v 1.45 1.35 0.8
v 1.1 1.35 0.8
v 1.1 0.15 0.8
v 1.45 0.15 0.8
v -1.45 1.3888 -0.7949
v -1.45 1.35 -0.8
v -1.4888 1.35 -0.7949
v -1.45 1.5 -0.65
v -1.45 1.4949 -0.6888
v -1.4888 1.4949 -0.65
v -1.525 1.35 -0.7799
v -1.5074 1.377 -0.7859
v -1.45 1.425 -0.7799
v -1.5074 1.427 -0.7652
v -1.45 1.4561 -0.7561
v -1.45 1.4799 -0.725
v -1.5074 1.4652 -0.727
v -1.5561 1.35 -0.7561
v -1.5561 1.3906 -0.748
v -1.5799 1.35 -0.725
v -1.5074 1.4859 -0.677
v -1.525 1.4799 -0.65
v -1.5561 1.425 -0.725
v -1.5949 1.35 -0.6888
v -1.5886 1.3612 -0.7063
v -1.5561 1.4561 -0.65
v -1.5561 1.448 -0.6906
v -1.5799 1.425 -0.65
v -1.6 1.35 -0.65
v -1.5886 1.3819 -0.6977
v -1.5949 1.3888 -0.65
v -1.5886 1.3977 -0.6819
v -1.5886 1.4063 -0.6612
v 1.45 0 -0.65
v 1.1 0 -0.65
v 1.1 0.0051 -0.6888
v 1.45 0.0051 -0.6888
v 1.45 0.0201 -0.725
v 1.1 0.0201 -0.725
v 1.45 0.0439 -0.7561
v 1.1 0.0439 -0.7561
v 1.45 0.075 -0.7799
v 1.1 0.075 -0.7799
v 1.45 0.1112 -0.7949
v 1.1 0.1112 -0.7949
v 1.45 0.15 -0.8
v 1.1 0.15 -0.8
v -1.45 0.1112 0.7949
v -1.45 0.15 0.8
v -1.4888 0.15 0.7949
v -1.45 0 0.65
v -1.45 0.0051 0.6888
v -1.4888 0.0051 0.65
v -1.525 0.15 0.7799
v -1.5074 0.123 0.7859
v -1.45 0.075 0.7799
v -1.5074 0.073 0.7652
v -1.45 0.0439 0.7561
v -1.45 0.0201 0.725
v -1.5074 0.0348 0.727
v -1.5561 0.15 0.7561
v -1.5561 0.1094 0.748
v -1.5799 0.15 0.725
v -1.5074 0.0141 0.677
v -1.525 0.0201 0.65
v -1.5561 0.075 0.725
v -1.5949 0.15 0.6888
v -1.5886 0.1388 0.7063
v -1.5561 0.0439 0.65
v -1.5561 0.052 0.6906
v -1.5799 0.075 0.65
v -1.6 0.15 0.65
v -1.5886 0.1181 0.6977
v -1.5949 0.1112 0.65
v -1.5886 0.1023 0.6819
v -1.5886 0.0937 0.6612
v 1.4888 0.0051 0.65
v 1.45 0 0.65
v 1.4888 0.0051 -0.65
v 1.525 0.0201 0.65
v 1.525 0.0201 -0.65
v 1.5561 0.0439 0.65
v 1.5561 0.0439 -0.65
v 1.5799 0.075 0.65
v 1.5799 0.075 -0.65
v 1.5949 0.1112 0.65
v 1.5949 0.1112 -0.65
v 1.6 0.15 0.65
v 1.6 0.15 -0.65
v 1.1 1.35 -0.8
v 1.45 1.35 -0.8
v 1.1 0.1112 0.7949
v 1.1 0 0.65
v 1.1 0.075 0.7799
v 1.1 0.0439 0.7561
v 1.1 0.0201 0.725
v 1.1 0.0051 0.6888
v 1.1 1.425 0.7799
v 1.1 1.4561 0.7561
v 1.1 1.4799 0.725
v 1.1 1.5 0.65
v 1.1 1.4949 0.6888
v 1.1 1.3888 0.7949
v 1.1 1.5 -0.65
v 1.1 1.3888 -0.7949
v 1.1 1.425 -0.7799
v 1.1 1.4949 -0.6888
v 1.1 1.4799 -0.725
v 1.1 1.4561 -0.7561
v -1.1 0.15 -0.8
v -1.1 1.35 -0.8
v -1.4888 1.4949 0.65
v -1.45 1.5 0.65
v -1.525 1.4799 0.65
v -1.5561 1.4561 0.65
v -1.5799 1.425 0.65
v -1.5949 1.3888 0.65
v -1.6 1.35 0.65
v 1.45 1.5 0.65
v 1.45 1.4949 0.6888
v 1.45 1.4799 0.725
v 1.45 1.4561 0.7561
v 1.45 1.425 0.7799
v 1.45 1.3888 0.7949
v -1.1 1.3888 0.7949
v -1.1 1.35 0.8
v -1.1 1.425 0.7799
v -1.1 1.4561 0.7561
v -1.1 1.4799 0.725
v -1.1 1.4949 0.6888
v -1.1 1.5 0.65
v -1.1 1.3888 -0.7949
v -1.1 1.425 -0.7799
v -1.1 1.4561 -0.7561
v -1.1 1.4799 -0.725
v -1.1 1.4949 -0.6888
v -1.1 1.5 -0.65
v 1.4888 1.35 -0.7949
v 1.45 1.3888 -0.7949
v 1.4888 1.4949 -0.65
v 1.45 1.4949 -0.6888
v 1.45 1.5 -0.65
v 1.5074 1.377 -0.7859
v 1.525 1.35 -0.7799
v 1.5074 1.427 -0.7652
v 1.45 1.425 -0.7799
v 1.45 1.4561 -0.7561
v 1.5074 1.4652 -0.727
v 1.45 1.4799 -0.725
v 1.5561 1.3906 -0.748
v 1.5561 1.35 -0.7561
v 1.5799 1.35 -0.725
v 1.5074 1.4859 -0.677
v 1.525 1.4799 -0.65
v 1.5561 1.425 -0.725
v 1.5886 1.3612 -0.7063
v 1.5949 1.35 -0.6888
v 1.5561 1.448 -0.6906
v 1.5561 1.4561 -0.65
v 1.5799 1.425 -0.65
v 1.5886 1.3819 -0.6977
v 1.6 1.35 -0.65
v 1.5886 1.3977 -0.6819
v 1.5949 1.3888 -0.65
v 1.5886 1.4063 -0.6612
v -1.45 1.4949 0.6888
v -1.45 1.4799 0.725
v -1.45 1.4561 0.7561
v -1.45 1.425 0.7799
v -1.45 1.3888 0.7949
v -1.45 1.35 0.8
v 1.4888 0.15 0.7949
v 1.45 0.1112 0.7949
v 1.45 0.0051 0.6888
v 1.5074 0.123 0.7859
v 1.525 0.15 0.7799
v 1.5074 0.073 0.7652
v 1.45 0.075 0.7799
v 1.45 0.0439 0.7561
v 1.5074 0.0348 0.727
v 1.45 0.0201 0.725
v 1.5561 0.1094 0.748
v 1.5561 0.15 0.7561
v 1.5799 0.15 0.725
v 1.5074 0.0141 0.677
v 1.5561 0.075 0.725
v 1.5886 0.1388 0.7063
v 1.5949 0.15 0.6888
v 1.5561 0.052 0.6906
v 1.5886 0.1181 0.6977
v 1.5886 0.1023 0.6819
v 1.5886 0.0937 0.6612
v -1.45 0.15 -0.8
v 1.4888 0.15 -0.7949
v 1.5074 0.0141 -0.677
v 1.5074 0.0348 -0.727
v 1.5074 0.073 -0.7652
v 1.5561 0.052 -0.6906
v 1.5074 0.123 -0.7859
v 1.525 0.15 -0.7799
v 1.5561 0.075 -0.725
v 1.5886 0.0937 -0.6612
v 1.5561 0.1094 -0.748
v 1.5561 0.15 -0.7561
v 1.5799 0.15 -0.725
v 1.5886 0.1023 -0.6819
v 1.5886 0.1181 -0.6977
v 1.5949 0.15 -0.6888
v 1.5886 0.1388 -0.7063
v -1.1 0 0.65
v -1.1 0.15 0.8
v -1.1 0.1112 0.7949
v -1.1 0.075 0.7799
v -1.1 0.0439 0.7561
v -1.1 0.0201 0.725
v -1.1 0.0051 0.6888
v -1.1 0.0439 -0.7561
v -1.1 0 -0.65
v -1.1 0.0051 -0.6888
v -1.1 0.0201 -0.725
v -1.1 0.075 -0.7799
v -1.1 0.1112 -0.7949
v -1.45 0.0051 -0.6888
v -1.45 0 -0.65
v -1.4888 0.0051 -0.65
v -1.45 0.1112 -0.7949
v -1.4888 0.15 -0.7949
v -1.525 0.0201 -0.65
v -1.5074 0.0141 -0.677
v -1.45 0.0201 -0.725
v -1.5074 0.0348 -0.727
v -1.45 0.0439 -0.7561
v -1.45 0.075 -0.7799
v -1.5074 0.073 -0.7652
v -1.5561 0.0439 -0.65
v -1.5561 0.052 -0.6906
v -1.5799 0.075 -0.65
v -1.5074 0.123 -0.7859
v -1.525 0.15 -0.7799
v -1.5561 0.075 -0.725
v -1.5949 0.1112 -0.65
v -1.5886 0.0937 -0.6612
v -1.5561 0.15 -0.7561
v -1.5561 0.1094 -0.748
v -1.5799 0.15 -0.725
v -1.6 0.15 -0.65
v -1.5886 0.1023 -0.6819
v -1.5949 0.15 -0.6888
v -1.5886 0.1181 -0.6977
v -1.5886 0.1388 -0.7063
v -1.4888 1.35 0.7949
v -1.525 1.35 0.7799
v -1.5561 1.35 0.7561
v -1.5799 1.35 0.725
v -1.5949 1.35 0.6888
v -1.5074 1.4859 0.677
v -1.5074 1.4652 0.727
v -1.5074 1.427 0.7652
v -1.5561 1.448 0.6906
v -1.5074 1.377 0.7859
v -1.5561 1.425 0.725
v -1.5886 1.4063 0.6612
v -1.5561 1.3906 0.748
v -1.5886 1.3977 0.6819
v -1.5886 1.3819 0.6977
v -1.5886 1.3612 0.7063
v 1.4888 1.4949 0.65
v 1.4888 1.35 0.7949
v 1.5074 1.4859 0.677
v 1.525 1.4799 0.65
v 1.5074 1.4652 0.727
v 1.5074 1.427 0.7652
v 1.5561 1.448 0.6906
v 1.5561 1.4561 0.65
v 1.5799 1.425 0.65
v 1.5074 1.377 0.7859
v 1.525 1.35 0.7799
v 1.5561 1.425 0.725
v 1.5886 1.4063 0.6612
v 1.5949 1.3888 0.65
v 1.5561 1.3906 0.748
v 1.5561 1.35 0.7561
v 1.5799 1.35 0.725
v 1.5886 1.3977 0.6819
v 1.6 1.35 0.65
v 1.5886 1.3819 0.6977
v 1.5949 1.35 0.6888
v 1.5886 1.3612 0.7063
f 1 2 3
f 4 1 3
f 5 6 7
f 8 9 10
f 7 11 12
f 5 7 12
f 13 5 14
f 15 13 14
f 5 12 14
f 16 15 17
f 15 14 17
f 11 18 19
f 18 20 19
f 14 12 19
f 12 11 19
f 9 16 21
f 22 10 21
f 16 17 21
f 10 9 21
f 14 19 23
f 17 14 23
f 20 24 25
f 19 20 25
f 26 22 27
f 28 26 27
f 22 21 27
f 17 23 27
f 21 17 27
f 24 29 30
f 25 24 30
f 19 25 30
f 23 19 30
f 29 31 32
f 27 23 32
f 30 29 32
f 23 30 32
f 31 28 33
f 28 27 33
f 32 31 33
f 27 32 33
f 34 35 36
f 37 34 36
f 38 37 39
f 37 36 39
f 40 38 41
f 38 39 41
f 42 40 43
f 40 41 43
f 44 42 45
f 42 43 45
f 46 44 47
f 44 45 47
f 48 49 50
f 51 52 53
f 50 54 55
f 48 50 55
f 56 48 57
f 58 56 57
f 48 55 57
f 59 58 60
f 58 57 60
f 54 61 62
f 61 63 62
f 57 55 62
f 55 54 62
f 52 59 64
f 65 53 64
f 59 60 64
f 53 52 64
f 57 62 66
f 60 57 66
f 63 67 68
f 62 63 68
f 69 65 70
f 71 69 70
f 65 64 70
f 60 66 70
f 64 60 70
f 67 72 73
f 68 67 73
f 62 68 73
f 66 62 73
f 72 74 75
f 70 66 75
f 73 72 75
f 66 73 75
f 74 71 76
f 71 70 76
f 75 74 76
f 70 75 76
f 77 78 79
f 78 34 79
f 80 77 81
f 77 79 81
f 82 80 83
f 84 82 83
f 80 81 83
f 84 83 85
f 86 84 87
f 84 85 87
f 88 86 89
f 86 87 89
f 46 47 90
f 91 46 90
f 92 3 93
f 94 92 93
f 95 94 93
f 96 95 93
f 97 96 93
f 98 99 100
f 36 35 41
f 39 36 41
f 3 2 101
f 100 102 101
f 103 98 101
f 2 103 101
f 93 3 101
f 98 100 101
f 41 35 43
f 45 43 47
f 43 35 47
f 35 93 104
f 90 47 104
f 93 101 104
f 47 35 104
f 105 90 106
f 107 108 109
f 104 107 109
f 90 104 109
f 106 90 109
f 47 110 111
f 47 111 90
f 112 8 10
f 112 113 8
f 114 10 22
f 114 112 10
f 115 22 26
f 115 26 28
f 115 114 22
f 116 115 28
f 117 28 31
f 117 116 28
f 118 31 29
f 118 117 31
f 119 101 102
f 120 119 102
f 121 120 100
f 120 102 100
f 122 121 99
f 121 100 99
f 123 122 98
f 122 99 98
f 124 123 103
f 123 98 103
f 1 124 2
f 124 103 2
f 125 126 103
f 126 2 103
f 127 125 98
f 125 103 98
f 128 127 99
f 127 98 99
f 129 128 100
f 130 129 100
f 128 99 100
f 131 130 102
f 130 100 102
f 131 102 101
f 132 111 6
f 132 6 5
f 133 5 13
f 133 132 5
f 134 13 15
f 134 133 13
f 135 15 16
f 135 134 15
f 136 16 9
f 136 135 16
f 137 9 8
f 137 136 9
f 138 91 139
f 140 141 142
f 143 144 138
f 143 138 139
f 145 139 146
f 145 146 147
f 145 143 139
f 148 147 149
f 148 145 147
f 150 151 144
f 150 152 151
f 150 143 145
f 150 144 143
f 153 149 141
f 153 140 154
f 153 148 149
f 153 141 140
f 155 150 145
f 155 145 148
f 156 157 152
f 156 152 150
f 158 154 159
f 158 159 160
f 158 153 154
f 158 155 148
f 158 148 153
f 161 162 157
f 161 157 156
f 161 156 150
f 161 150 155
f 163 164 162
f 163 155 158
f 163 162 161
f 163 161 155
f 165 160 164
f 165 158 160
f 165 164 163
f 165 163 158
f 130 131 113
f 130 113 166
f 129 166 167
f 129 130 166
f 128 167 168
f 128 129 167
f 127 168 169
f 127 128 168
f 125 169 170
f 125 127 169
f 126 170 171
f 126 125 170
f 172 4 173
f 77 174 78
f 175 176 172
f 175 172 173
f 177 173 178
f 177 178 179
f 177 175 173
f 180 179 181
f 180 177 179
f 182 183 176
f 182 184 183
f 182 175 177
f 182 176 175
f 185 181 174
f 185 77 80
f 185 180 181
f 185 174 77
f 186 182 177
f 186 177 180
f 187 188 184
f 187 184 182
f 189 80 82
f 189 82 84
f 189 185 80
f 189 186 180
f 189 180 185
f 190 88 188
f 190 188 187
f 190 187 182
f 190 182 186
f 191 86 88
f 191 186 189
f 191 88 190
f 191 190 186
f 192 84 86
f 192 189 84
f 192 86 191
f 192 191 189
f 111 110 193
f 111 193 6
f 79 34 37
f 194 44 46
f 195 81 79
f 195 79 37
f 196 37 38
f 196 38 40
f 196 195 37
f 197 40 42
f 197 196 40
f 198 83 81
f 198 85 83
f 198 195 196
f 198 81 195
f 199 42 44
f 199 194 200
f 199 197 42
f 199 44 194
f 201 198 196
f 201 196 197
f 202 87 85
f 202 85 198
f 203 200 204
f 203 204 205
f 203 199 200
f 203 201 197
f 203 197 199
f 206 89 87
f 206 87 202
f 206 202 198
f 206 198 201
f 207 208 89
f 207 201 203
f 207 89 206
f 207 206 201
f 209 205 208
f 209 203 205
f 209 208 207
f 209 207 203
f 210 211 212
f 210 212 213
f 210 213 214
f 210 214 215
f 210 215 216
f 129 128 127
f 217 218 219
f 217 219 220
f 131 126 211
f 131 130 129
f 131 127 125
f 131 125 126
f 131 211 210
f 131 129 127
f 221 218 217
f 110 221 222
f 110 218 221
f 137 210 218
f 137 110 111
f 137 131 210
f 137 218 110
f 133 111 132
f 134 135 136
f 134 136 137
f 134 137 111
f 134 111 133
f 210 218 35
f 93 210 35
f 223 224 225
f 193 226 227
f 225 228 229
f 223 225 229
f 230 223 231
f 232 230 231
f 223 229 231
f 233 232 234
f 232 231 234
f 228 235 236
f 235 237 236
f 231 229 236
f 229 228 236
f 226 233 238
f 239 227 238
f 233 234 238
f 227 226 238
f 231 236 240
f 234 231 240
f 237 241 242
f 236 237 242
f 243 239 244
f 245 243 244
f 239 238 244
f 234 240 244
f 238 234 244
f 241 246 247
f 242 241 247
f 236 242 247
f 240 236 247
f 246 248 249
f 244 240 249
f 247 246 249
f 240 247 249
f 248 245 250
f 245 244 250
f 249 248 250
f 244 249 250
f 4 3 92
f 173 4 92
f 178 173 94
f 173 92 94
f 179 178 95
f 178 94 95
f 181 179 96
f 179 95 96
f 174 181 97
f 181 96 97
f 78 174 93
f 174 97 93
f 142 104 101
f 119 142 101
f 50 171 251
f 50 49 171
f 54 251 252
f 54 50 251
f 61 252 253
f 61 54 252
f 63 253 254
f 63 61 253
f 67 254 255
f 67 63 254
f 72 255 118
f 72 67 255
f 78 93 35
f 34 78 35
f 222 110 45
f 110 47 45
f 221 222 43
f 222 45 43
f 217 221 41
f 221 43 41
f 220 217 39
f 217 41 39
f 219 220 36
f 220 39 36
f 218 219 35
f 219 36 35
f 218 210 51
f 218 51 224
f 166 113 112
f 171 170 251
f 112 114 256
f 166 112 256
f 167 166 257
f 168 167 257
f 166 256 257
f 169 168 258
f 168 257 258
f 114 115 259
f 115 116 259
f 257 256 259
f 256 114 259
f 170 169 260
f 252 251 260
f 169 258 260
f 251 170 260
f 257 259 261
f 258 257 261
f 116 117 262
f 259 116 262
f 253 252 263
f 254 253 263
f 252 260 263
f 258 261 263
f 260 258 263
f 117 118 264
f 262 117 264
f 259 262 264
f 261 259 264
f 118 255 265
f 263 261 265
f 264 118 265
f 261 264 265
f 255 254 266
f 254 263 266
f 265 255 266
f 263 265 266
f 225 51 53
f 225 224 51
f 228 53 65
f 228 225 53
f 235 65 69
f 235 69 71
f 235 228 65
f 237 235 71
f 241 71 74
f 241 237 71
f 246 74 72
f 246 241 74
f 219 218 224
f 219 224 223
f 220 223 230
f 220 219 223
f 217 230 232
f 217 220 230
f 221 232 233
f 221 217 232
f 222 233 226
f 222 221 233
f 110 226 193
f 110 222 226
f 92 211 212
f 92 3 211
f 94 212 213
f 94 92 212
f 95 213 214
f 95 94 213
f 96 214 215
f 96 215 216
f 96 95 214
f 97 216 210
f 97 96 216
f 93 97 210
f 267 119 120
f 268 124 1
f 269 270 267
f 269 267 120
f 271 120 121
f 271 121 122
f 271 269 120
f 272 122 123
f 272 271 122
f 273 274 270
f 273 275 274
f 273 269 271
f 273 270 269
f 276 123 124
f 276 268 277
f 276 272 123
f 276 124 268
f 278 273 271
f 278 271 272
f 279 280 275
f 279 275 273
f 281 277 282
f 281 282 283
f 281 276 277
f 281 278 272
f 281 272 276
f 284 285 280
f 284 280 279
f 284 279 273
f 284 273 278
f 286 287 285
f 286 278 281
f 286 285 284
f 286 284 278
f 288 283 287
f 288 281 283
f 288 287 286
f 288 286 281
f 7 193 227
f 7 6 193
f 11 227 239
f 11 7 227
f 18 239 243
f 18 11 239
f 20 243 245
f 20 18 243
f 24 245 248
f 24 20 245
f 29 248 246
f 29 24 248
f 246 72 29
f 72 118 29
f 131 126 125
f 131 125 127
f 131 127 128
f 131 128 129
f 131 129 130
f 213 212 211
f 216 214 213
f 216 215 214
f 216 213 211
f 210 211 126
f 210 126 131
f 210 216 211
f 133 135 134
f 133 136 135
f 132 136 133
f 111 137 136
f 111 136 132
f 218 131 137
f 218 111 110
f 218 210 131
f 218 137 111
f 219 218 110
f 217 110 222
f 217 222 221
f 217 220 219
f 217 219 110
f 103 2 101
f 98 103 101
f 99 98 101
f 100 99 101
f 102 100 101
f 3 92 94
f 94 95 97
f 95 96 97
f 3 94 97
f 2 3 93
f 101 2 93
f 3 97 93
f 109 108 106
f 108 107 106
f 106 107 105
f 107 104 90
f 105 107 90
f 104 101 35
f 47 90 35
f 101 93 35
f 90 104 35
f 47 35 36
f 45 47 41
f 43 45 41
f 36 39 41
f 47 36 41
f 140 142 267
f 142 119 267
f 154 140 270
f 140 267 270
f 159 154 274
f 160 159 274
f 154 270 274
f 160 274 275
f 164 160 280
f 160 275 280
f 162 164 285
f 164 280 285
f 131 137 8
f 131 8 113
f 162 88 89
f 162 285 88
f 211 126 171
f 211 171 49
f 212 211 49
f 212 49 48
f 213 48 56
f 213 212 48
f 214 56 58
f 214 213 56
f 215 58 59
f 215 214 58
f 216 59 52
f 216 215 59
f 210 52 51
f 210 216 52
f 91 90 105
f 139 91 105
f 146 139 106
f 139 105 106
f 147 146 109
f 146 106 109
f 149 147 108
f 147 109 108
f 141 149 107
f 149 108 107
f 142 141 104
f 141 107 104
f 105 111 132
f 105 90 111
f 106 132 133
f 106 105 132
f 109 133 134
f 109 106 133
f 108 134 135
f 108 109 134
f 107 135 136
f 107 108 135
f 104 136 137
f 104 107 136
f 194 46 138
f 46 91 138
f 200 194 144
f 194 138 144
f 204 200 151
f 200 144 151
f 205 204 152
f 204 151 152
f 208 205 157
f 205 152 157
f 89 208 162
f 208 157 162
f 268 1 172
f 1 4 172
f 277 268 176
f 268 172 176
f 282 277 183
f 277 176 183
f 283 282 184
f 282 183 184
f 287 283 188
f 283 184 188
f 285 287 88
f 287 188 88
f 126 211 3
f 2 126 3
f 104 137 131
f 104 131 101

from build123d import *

# Parameters (mm, degrees)
SKETCH1_W           = 2.2
SKETCH1_H           = 1.6
BOSS_EXTRUDE1_DEPTH = 1.5
FILLET1_R           = 0.15
BOSS_EXTRUDE2_DEPTH = 0.5
FILLET2_R           = 0.15


with BuildPart() as part:
    # Sketch1 → Boss-Extrude1 (new body)
    with BuildSketch(Plane(origin=(0, 0, 0), x_dir=(1, 0, 0), z_dir=(0, 1, 0))):
        Rectangle(SKETCH1_W, SKETCH1_H)
    extrude(amount=BOSS_EXTRUDE1_DEPTH)

    # Fillet1
    fillet1_edges = [part.edges().sort_by_distance(p)[0] for p in [
        (0, 1.5, -0.8),
        (0, 0, -0.8),
        (0, 0, 0.8),
        (0, 1.5, 0.8),
    ]]
    fillet(fillet1_edges, radius=FILLET1_R)


with BuildPart() as body_2:
    # Sketch2 → Boss-Extrude2 (new body)
    with BuildSketch(Plane(origin=(1.1, 0, 0), x_dir=(0, 0, -1), z_dir=(1, 0, 0))):
        with BuildLine():
            Line((-0.8, 1.35), (-0.8, 0.15))
            ThreePointArc((-0.8, 0.15), (-0.756066017, 0.043933983), (-0.65, 0))
            Line((-0.65, 0), (0.65, 0))
            ThreePointArc((0.65, 0), (0.756066017, 0.043933983), (0.8, 0.15))
            Line((0.8, 0.15), (0.8, 1.35))
            ThreePointArc((0.8, 1.35), (0.756066017, 1.456066017), (0.65, 1.5))
            Line((0.65, 1.5), (-0.65, 1.5))
            ThreePointArc((-0.65, 1.5), (-0.756066017, 1.456066017), (-0.8, 1.35))
        make_face()
    extrude(amount=BOSS_EXTRUDE2_DEPTH)

    # Fillet2
    fillet2_edges = [body_2.edges().sort_by_distance(p)[0] for p in [
        (1.6, 0.043933983, 0.756066017),
        (1.6, 0, 0),
        (1.6, 0.043933983, -0.756066017),
        (1.6, 0.75, -0.8),
        (1.6, 1.456066017, -0.756066017),
        (1.6, 1.5, 0),
        (1.6, 1.456066017, 0.756066017),
        (1.6, 0.75, 0.8),
    ]]
    fillet(fillet2_edges, radius=FILLET2_R)


with BuildPart() as body_3:
    # Mirror1: mirrored copy
    add(body_2.part.mirror(Plane(origin=(0, 0, 0), x_dir=(0, 0, 1), z_dir=(1, 0, 0))))


solid = Compound([part.part, body_2.part, body_3.part])
